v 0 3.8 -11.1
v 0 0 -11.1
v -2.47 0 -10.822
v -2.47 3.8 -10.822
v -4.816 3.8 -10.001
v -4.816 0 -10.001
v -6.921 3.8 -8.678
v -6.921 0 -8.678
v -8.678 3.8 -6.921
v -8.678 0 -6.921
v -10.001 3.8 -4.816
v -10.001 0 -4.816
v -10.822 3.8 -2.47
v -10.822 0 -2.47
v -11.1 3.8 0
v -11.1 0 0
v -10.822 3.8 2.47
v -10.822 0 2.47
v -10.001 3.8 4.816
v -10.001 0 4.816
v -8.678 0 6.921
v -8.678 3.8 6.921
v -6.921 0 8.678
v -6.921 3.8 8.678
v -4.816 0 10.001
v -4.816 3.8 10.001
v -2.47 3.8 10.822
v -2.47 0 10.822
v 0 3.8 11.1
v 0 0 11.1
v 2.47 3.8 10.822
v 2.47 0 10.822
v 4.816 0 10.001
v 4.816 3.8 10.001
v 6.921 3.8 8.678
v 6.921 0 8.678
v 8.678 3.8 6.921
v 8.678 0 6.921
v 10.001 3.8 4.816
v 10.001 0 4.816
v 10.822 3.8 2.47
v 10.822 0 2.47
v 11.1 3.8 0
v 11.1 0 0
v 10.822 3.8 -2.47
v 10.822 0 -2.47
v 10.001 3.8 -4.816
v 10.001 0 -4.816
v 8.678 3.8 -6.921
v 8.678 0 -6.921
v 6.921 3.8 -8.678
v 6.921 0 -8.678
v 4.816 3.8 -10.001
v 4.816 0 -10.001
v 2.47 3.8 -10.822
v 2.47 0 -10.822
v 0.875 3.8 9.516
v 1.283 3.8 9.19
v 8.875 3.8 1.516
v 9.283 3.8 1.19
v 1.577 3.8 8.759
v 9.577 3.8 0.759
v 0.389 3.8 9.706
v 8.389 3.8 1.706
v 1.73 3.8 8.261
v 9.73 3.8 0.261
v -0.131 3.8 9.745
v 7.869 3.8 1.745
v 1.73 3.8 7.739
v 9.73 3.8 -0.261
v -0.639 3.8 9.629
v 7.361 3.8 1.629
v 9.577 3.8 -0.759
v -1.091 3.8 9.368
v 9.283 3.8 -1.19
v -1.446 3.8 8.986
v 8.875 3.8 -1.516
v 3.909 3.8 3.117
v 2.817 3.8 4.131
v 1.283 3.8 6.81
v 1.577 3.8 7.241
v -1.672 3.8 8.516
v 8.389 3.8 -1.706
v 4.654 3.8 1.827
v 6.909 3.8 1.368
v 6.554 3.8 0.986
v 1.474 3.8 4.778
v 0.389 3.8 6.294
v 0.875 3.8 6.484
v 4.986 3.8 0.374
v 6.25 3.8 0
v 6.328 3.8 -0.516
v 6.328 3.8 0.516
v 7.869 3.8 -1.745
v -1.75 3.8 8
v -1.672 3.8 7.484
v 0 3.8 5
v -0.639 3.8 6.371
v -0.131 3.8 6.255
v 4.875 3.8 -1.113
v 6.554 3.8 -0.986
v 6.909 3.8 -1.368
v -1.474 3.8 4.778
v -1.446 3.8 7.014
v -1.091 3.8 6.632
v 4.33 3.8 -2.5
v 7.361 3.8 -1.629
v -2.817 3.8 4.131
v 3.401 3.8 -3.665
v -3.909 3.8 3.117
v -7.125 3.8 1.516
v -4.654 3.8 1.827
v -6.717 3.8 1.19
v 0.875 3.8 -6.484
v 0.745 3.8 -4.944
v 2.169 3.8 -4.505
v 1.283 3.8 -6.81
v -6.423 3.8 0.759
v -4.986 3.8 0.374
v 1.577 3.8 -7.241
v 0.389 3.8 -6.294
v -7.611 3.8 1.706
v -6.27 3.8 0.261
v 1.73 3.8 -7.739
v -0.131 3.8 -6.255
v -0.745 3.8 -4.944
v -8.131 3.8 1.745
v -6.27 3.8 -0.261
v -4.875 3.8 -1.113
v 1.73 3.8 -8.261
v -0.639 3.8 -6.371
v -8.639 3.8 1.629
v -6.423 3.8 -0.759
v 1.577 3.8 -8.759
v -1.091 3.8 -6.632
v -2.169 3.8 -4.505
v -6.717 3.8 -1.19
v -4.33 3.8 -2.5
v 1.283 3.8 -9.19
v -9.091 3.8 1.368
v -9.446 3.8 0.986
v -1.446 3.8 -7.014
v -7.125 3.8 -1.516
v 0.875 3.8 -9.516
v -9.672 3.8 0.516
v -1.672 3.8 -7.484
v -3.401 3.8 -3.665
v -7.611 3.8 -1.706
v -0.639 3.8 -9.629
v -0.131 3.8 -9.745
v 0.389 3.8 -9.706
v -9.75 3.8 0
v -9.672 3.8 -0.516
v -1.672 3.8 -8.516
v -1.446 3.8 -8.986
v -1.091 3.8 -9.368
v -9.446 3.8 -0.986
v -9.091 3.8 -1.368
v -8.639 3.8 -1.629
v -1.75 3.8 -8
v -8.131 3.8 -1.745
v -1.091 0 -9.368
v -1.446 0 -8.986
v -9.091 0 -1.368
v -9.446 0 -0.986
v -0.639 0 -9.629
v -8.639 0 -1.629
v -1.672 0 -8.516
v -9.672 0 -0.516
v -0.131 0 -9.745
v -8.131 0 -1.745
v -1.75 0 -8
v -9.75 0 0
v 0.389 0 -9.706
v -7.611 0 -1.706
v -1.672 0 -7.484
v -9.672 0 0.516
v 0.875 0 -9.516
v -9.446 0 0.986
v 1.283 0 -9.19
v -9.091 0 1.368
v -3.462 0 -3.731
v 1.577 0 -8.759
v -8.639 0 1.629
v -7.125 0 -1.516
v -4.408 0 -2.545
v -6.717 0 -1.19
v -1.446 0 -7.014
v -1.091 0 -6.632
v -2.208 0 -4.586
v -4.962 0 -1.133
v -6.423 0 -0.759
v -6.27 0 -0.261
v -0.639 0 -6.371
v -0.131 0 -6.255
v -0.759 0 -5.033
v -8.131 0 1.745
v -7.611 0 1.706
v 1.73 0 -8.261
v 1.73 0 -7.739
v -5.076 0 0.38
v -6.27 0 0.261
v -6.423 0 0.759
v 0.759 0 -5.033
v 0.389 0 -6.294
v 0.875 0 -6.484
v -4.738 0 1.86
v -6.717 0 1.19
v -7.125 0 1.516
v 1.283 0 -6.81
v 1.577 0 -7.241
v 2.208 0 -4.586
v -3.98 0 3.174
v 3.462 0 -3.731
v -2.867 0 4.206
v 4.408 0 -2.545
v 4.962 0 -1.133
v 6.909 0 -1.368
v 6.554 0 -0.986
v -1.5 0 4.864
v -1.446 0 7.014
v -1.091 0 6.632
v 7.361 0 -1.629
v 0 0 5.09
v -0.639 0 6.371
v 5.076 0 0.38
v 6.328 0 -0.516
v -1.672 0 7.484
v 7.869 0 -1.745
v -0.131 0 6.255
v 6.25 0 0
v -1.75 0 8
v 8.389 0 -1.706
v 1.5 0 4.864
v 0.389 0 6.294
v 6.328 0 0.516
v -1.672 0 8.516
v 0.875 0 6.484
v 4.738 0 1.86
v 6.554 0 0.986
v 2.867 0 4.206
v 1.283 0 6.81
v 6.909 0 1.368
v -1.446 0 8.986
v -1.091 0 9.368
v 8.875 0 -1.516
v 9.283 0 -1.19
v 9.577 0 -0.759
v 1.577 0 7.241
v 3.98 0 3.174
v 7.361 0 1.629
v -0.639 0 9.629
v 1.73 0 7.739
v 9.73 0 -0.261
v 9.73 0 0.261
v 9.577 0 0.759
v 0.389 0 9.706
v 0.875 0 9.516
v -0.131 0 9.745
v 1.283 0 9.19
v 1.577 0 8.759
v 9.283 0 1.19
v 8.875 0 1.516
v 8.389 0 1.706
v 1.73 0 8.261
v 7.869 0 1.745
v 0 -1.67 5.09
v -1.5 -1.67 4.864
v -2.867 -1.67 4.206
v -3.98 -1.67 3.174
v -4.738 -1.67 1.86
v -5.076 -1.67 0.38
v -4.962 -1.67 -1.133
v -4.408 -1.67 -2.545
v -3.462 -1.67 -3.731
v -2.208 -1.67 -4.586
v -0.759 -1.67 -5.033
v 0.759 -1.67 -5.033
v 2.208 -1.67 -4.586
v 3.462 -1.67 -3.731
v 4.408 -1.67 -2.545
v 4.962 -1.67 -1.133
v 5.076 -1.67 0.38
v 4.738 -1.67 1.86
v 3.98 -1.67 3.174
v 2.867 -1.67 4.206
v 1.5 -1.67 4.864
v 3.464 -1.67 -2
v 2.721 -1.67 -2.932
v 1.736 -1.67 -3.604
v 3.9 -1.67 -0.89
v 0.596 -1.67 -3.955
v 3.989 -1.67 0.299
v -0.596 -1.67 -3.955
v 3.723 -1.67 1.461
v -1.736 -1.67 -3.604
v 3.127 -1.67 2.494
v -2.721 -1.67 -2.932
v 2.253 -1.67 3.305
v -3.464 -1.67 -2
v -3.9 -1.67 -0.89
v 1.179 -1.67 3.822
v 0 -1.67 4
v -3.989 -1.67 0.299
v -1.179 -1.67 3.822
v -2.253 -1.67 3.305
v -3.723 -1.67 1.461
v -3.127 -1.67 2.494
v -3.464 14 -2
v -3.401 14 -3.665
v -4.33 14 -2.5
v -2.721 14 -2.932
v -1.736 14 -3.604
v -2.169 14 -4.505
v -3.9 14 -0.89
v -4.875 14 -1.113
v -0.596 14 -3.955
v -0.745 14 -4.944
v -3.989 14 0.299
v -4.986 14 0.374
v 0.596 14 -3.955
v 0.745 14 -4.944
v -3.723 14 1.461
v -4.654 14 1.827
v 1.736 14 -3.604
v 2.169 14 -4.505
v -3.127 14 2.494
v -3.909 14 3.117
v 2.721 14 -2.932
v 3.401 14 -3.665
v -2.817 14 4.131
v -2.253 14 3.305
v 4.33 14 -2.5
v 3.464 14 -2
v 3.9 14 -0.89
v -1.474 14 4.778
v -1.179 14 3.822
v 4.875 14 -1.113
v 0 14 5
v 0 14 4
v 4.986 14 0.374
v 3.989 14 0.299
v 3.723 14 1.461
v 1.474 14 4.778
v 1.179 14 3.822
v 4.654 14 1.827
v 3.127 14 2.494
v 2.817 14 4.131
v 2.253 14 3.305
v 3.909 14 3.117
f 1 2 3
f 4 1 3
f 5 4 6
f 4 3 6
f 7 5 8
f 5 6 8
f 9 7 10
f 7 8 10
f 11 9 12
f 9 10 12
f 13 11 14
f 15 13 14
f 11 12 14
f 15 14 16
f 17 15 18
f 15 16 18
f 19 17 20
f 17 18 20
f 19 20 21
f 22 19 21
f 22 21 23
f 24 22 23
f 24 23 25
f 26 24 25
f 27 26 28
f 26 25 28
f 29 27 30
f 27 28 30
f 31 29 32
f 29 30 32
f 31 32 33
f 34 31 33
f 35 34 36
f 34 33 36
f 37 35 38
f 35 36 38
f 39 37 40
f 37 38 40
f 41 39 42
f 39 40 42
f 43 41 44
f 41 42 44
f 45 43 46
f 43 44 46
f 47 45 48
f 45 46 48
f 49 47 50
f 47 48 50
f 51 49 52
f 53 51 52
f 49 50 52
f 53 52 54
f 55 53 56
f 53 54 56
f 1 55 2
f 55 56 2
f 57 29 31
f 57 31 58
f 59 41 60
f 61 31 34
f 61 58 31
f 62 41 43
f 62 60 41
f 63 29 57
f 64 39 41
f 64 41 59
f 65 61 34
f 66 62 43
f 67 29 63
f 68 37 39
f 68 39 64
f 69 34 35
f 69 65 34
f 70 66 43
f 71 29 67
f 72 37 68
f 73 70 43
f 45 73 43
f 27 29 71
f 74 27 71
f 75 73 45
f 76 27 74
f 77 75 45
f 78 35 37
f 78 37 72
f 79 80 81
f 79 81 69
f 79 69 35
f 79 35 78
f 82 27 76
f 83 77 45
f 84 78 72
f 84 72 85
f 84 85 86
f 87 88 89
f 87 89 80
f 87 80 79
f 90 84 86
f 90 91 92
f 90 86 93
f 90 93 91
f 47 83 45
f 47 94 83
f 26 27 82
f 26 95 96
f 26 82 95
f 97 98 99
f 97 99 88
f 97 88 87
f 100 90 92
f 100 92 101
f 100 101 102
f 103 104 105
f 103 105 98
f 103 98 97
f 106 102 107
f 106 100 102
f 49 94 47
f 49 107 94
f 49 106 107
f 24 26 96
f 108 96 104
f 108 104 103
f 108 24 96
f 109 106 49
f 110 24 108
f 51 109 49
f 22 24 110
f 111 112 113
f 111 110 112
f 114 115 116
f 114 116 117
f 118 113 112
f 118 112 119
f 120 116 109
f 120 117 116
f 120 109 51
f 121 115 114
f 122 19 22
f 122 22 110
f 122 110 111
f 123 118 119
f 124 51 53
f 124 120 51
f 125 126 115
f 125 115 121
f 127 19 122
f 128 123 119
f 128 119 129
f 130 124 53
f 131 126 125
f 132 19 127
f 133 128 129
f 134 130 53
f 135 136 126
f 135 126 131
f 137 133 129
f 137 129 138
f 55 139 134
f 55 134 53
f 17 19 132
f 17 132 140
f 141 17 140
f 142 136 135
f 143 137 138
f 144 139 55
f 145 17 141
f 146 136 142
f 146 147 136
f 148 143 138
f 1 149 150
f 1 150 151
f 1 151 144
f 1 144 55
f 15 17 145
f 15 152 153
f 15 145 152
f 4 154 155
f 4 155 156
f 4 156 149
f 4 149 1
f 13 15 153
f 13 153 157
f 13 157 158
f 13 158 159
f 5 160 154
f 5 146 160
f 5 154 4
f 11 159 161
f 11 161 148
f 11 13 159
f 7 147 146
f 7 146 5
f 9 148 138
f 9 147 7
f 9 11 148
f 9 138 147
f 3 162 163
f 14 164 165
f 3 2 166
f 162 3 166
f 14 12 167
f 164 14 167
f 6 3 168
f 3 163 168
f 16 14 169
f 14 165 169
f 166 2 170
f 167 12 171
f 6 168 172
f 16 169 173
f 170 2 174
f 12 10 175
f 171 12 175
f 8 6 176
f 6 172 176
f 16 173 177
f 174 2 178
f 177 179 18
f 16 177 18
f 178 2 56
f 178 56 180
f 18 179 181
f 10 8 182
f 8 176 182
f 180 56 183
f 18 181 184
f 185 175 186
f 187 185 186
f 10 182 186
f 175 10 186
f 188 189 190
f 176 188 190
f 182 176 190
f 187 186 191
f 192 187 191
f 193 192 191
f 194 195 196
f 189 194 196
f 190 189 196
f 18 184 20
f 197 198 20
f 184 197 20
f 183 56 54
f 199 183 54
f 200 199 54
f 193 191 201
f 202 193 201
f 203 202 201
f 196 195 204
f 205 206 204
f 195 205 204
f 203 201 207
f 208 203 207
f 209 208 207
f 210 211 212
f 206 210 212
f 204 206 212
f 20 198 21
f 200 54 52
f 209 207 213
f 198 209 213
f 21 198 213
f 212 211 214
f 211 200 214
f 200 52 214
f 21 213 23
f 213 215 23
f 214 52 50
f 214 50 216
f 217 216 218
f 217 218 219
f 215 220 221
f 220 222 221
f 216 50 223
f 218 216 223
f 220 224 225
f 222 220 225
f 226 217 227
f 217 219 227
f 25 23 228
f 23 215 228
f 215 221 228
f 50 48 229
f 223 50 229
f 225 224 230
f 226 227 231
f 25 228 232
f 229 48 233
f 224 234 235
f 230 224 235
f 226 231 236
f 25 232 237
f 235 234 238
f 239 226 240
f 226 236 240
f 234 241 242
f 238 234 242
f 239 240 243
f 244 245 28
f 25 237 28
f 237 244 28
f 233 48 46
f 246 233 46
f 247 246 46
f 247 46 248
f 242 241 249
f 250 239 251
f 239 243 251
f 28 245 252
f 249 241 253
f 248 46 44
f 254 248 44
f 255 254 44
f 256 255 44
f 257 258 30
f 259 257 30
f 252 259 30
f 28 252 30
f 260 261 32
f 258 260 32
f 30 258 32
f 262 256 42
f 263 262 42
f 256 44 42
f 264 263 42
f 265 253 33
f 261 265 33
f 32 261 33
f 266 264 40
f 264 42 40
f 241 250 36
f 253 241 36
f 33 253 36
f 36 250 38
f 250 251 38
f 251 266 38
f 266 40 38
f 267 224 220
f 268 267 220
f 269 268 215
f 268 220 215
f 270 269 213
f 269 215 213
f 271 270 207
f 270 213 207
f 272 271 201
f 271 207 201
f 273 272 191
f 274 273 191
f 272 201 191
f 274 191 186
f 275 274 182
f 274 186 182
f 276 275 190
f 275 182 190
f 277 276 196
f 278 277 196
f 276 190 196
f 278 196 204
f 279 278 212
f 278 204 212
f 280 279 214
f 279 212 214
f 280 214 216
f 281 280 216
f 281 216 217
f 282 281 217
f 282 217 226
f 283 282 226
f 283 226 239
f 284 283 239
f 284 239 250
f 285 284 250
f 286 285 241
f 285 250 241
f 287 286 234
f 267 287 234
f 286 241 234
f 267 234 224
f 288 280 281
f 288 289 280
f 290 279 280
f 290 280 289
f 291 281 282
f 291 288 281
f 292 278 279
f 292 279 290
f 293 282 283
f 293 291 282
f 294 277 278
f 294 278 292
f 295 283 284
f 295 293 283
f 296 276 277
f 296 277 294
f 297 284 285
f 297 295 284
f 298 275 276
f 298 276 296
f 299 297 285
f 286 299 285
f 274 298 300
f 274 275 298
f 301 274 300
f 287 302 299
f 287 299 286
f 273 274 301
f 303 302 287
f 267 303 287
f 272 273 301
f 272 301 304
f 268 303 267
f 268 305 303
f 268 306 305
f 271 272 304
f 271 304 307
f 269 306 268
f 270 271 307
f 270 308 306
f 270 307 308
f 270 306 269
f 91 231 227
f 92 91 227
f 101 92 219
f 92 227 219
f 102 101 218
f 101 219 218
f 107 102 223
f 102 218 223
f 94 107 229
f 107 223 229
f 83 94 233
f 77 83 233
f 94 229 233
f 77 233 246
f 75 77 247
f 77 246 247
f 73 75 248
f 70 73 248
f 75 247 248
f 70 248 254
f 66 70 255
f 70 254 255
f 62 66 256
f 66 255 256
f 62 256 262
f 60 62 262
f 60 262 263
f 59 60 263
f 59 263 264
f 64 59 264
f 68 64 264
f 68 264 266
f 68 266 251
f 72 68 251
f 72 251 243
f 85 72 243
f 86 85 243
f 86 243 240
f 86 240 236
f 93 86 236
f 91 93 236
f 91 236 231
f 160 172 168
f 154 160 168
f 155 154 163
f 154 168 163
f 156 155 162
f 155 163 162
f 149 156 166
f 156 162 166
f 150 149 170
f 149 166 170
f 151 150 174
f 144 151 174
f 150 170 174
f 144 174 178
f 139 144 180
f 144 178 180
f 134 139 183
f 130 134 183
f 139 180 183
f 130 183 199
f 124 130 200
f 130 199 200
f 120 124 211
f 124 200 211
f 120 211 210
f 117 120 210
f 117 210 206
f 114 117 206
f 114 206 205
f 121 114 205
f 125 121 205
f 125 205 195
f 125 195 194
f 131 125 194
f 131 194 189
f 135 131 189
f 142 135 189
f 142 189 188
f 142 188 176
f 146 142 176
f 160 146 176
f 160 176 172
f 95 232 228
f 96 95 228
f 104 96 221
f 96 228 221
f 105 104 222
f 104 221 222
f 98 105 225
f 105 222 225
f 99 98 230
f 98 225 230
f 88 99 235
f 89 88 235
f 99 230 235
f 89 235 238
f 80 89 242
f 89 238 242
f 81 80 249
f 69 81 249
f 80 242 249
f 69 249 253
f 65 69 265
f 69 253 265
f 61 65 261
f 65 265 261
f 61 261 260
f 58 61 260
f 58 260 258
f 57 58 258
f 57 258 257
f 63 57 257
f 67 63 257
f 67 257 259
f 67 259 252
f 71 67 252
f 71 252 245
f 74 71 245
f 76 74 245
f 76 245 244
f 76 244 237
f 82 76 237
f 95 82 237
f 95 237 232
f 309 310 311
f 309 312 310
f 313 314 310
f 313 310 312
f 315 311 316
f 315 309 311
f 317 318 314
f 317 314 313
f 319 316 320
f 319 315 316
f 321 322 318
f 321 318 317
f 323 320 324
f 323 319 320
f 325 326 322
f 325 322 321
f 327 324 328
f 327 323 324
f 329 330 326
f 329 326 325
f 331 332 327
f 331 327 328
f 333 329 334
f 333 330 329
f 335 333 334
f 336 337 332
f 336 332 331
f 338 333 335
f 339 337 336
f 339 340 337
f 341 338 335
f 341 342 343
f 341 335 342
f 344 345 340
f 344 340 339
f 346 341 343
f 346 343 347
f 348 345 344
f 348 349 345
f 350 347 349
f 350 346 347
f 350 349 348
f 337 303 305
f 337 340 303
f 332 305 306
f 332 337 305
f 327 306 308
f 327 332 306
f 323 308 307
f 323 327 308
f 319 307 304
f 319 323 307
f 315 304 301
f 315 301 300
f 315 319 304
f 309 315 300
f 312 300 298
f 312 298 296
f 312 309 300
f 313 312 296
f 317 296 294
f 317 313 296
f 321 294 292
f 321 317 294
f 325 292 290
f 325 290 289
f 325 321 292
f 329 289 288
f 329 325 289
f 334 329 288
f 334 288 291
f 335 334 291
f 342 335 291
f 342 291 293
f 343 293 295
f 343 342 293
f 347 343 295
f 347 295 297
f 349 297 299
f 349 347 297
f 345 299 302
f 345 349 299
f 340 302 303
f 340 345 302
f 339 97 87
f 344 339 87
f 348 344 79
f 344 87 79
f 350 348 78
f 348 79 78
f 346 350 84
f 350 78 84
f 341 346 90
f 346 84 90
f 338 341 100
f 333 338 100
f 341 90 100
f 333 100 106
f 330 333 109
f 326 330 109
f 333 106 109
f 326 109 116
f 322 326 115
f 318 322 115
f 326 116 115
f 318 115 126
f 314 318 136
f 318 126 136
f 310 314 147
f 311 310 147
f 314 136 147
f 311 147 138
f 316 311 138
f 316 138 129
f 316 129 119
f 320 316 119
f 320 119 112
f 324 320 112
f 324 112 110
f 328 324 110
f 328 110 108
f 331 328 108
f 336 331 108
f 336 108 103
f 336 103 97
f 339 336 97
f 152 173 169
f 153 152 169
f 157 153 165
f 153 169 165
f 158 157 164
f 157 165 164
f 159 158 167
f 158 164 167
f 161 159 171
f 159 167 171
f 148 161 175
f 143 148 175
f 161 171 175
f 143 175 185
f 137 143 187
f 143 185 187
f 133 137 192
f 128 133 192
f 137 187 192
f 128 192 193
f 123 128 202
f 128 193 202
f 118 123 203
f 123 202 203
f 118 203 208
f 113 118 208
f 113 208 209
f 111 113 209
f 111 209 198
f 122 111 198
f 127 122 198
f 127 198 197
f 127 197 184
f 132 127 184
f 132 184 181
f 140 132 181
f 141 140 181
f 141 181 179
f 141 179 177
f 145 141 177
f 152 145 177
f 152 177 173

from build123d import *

# Parameters (mm, degrees)
SKETCH1_R                  = 11.1
BOSS_EXTRUDE1_DEPTH        = 3.8
BOSS_EXTRUDE2_START        = -3.8
SKETCH2_R                  = 5
BOSS_EXTRUDE2_DEPTH        = 14
SKETCH3_R                  = 4
CUT_EXTRUDE1_DEPTH         = 22.033782351
SKETCH4_R                  = 5.09
SKETCH4_R_2                = 4
BOSS_EXTRUDE3_DEPTH        = 1.67
F_3_5_3_5_DIAMETER_HOLE1_D = 3.5


with BuildPart() as part:
    # Sketch1 → Boss-Extrude1 (new body)
    with BuildSketch(Plane(origin=(0, 0, 0), x_dir=(1, 0, 0), z_dir=(0, 1, 0))):
        with Locations(Location((0, 0, 0), (0, 0, 90))):
            Circle(SKETCH1_R)
    extrude(amount=BOSS_EXTRUDE1_DEPTH)

    # Sketch2 → Boss-Extrude2 (add)
    with BuildSketch(Plane(origin=(0, 3.8, 0), x_dir=(1, 0, 0), z_dir=(0, 1, 0)).offset(BOSS_EXTRUDE2_START)):
        with Locations(Location((0, 0, 0), (0, 0, 270))):
            Circle(SKETCH2_R)
    extrude(amount=BOSS_EXTRUDE2_DEPTH)

    # Sketch3 → Cut-Extrude1 (cut, through all)
    with BuildSketch(Plane(origin=(0, 14, 0), x_dir=(1, 0, 0), z_dir=(0, 1, 0))):
        with Locations(Location((0, 0, 0), (0, 0, 270))):
            Circle(SKETCH3_R)
    extrude(amount=-CUT_EXTRUDE1_DEPTH, mode=Mode.SUBTRACT)

    # Sketch4 → Boss-Extrude3 (add)
    with BuildSketch(Plane.XZ):
        with Locations(Location((0, 0, 0), (0, 0, 90))):
            Circle(SKETCH4_R)
        with Locations(Location((0, 0, 0), (0, 0, 90))):
            Circle(SKETCH4_R_2, mode=Mode.SUBTRACT)
    extrude(amount=BOSS_EXTRUDE3_DEPTH)

    # Ø3.5 (3.5) Diameter Hole1 (through all)
    with Locations(Plane(origin=(0, 3.8, 0), x_dir=(1, 0, 0), z_dir=(0, 1, 0))):
        with Locations((0, 8), (0, -8), (8, 0), (-8, 0)):
            Hole(F_3_5_3_5_DIAMETER_HOLE1_D / 2)


solid = part.part
